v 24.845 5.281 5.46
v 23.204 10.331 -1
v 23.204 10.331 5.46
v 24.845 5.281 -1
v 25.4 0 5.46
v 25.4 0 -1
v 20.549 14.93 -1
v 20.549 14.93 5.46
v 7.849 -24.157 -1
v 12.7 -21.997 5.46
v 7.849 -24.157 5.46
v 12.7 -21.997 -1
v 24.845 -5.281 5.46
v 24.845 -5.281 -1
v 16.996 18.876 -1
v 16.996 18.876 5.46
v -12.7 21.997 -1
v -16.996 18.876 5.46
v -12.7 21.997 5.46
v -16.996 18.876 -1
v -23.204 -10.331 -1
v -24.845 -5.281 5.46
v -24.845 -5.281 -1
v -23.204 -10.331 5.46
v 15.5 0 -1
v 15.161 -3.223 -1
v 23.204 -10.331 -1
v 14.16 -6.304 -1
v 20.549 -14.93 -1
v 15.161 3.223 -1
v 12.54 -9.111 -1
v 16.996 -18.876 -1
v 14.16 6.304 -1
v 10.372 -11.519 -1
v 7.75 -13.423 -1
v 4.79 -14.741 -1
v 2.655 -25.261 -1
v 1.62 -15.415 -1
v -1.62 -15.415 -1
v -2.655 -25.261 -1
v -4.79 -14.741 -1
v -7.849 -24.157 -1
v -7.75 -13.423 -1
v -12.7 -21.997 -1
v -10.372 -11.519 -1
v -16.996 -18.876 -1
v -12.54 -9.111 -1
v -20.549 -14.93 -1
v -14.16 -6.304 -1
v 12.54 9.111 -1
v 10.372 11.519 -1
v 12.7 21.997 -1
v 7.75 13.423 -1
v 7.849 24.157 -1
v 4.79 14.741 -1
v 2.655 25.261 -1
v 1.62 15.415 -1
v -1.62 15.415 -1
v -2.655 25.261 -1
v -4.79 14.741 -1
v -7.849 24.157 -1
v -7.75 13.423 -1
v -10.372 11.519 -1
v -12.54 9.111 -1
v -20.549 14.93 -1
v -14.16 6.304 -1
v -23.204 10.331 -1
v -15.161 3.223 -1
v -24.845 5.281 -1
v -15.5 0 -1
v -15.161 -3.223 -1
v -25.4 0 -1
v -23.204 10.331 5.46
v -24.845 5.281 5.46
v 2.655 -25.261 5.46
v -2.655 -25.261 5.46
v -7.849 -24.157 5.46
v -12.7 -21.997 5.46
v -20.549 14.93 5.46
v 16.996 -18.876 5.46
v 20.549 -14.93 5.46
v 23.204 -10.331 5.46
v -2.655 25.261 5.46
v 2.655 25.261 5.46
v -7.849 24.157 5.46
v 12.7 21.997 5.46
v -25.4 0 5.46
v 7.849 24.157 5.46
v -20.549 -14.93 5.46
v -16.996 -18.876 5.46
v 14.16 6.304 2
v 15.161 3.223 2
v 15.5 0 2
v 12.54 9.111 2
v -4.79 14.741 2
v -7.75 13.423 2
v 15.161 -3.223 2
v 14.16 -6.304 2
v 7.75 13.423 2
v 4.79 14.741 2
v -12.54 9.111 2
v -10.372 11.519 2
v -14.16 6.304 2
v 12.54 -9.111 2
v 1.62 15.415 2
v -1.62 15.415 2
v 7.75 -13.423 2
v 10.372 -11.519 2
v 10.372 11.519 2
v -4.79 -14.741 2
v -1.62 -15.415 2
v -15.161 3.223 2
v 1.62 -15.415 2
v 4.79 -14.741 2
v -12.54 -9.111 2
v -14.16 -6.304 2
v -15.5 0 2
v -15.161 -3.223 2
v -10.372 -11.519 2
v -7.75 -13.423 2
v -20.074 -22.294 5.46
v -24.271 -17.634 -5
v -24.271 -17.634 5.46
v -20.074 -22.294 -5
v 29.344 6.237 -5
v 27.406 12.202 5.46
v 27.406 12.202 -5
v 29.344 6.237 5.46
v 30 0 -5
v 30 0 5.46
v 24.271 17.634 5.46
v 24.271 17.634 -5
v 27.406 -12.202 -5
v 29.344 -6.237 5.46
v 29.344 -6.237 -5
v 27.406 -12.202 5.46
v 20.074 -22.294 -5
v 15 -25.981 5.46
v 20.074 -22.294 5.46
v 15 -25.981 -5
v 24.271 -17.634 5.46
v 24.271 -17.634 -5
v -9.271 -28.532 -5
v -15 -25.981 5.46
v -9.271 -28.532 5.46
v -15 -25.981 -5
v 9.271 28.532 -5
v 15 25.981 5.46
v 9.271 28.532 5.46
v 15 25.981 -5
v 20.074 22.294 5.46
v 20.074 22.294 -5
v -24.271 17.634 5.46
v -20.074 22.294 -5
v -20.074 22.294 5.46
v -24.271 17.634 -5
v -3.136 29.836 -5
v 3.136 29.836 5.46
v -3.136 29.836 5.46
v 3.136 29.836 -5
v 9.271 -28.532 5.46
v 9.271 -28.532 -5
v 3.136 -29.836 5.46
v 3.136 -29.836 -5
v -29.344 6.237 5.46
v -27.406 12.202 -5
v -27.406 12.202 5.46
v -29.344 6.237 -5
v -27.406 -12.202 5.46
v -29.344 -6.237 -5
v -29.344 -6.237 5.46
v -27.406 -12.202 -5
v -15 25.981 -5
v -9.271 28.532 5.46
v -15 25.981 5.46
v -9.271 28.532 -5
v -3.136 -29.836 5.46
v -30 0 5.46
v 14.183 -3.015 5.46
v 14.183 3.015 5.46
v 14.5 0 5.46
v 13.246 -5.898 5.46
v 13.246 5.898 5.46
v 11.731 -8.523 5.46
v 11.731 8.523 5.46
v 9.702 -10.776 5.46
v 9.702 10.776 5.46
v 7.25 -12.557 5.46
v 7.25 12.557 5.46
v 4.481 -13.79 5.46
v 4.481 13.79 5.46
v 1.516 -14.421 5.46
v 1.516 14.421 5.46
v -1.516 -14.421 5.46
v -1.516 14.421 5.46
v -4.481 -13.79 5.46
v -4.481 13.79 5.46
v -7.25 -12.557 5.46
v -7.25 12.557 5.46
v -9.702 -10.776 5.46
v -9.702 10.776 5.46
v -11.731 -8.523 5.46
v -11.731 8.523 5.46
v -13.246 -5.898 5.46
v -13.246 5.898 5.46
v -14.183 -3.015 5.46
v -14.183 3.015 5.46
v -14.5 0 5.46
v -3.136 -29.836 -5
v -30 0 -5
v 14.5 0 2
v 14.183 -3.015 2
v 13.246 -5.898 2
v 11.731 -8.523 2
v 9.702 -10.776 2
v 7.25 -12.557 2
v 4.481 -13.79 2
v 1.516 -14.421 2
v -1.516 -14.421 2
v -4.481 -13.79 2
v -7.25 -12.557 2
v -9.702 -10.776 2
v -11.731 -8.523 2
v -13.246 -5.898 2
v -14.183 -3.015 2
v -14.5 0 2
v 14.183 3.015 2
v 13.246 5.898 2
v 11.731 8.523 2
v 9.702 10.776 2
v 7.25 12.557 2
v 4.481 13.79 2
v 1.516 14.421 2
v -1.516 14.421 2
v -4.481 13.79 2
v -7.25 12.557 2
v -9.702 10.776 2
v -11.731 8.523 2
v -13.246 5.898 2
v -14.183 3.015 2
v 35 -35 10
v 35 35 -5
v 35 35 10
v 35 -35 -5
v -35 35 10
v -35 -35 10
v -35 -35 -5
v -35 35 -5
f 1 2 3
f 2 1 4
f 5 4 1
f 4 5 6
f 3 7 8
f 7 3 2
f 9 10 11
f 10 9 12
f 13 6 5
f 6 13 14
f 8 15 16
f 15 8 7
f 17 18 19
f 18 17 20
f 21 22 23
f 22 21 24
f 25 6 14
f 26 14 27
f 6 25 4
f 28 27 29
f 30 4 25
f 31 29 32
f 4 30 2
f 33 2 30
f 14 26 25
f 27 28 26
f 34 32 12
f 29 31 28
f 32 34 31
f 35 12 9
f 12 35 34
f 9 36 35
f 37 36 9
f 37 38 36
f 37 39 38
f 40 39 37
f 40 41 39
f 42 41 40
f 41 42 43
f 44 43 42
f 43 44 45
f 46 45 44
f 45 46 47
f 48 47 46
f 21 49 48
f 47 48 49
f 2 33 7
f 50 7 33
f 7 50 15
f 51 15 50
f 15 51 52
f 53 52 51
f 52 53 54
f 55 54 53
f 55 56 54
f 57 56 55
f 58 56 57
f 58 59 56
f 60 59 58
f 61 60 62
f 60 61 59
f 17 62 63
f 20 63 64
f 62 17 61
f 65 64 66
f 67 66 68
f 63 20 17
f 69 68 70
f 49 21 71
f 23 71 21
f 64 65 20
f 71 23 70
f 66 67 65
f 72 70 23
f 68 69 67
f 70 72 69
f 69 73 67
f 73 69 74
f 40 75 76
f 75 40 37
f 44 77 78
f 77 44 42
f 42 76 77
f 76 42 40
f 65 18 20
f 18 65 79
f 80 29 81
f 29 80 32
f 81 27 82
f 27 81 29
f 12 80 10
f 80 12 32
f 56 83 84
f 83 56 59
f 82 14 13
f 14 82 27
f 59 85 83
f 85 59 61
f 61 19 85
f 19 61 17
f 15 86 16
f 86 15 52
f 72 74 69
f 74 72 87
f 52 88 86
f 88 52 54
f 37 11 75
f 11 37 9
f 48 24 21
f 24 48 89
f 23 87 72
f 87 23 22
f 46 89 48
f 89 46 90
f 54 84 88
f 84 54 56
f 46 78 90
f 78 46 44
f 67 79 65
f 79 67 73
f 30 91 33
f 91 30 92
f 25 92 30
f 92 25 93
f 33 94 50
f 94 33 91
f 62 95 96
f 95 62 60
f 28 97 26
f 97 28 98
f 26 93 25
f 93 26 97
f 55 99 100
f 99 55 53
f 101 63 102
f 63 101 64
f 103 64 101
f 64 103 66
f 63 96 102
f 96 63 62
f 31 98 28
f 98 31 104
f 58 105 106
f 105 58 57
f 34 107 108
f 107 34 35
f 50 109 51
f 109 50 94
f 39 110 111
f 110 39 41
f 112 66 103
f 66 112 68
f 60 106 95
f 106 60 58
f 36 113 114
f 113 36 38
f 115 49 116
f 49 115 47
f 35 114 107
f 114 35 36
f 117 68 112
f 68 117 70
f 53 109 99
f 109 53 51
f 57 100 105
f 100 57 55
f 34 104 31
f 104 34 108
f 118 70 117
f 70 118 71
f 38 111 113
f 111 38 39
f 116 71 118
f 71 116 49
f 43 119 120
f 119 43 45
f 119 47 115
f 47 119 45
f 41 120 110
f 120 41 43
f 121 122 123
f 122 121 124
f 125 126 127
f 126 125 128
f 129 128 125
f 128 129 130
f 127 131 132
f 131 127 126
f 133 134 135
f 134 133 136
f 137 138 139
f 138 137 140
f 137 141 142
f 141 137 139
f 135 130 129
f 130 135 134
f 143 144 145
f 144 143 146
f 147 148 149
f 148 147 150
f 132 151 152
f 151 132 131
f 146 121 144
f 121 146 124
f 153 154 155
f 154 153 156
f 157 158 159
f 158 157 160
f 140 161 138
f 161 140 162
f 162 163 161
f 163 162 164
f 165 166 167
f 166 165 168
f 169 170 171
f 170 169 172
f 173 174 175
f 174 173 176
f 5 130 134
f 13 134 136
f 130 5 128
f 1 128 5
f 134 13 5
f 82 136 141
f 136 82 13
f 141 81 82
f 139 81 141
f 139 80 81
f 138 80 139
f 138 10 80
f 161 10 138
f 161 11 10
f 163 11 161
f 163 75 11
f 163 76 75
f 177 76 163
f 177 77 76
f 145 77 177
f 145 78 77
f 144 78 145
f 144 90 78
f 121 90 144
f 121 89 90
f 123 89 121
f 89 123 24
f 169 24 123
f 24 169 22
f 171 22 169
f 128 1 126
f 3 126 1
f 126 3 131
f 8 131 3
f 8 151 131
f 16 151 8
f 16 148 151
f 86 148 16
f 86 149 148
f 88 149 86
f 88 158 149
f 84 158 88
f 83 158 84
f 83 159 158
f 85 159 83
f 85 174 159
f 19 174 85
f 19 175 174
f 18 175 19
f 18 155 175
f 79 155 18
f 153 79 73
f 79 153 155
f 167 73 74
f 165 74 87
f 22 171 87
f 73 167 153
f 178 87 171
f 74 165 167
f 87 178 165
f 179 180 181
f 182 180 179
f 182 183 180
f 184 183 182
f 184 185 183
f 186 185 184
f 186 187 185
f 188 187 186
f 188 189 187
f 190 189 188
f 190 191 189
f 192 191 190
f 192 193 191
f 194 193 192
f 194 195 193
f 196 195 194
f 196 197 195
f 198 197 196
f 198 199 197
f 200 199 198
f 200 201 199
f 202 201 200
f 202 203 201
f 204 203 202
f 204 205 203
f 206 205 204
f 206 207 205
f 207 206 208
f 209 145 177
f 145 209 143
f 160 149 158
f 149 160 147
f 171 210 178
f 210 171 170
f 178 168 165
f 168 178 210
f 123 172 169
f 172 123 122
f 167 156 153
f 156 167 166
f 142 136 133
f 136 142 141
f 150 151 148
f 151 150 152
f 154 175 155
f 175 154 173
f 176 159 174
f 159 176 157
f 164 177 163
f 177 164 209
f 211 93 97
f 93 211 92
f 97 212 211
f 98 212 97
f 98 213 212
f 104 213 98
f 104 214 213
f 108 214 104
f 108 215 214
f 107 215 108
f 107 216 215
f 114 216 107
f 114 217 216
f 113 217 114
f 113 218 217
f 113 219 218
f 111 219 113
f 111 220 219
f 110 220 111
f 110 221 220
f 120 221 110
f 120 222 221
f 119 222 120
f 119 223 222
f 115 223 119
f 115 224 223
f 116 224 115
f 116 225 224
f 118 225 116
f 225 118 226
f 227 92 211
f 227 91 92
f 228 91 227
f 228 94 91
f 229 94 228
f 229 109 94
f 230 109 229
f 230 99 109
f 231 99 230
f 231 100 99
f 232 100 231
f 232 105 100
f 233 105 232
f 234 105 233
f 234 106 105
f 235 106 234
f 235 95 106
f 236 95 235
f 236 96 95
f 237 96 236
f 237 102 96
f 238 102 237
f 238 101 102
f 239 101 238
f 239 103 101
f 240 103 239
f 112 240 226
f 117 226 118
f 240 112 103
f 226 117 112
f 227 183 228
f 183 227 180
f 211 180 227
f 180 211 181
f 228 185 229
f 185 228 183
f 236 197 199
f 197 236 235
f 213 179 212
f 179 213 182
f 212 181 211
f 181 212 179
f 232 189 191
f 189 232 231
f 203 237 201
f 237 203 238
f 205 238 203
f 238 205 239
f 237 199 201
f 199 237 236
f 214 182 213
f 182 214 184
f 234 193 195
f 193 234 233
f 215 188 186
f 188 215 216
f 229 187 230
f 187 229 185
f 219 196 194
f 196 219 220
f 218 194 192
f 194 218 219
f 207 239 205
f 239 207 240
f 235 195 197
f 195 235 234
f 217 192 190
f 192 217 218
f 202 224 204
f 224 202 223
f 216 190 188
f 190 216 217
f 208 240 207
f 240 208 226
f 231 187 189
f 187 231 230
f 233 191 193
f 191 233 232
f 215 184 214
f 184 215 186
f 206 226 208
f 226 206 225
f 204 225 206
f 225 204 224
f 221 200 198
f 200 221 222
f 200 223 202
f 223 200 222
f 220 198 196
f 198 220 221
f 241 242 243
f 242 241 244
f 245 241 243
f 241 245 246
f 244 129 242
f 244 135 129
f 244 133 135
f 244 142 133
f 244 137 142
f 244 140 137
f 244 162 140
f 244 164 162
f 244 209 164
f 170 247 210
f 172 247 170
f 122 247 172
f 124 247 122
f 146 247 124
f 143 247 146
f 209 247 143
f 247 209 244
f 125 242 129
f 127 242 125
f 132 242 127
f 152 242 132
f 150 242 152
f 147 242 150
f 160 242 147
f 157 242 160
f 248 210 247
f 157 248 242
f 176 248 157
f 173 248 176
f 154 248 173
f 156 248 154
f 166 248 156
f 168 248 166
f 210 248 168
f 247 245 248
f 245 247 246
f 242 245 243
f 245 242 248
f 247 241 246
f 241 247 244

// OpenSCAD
difference()
    {
        translate([0,0,2.5]) {
         cube([70, 70, 15],center=true);
        }


//thing being subtracted 
difference()
  {
  difference()
    {
        cylinder(h=10.92, r1=30, r2=30,center=true);
        translate([0,0,14]) {
        difference()
            {
            cylinder(30,r1=25.4,r2=25.4,center=true);
            cylinder(60,r1=15.5,r2=15.5,center=true);   
            }
        }
}
   translate([0,0,23]) {
  difference()
 {
    cylinder(42,r1=25.4,r2=25.4,center=true);
    cylinder(60,r1=14.5,r2=14.5,center=true);   
 }
}
}
}



 
 
 
